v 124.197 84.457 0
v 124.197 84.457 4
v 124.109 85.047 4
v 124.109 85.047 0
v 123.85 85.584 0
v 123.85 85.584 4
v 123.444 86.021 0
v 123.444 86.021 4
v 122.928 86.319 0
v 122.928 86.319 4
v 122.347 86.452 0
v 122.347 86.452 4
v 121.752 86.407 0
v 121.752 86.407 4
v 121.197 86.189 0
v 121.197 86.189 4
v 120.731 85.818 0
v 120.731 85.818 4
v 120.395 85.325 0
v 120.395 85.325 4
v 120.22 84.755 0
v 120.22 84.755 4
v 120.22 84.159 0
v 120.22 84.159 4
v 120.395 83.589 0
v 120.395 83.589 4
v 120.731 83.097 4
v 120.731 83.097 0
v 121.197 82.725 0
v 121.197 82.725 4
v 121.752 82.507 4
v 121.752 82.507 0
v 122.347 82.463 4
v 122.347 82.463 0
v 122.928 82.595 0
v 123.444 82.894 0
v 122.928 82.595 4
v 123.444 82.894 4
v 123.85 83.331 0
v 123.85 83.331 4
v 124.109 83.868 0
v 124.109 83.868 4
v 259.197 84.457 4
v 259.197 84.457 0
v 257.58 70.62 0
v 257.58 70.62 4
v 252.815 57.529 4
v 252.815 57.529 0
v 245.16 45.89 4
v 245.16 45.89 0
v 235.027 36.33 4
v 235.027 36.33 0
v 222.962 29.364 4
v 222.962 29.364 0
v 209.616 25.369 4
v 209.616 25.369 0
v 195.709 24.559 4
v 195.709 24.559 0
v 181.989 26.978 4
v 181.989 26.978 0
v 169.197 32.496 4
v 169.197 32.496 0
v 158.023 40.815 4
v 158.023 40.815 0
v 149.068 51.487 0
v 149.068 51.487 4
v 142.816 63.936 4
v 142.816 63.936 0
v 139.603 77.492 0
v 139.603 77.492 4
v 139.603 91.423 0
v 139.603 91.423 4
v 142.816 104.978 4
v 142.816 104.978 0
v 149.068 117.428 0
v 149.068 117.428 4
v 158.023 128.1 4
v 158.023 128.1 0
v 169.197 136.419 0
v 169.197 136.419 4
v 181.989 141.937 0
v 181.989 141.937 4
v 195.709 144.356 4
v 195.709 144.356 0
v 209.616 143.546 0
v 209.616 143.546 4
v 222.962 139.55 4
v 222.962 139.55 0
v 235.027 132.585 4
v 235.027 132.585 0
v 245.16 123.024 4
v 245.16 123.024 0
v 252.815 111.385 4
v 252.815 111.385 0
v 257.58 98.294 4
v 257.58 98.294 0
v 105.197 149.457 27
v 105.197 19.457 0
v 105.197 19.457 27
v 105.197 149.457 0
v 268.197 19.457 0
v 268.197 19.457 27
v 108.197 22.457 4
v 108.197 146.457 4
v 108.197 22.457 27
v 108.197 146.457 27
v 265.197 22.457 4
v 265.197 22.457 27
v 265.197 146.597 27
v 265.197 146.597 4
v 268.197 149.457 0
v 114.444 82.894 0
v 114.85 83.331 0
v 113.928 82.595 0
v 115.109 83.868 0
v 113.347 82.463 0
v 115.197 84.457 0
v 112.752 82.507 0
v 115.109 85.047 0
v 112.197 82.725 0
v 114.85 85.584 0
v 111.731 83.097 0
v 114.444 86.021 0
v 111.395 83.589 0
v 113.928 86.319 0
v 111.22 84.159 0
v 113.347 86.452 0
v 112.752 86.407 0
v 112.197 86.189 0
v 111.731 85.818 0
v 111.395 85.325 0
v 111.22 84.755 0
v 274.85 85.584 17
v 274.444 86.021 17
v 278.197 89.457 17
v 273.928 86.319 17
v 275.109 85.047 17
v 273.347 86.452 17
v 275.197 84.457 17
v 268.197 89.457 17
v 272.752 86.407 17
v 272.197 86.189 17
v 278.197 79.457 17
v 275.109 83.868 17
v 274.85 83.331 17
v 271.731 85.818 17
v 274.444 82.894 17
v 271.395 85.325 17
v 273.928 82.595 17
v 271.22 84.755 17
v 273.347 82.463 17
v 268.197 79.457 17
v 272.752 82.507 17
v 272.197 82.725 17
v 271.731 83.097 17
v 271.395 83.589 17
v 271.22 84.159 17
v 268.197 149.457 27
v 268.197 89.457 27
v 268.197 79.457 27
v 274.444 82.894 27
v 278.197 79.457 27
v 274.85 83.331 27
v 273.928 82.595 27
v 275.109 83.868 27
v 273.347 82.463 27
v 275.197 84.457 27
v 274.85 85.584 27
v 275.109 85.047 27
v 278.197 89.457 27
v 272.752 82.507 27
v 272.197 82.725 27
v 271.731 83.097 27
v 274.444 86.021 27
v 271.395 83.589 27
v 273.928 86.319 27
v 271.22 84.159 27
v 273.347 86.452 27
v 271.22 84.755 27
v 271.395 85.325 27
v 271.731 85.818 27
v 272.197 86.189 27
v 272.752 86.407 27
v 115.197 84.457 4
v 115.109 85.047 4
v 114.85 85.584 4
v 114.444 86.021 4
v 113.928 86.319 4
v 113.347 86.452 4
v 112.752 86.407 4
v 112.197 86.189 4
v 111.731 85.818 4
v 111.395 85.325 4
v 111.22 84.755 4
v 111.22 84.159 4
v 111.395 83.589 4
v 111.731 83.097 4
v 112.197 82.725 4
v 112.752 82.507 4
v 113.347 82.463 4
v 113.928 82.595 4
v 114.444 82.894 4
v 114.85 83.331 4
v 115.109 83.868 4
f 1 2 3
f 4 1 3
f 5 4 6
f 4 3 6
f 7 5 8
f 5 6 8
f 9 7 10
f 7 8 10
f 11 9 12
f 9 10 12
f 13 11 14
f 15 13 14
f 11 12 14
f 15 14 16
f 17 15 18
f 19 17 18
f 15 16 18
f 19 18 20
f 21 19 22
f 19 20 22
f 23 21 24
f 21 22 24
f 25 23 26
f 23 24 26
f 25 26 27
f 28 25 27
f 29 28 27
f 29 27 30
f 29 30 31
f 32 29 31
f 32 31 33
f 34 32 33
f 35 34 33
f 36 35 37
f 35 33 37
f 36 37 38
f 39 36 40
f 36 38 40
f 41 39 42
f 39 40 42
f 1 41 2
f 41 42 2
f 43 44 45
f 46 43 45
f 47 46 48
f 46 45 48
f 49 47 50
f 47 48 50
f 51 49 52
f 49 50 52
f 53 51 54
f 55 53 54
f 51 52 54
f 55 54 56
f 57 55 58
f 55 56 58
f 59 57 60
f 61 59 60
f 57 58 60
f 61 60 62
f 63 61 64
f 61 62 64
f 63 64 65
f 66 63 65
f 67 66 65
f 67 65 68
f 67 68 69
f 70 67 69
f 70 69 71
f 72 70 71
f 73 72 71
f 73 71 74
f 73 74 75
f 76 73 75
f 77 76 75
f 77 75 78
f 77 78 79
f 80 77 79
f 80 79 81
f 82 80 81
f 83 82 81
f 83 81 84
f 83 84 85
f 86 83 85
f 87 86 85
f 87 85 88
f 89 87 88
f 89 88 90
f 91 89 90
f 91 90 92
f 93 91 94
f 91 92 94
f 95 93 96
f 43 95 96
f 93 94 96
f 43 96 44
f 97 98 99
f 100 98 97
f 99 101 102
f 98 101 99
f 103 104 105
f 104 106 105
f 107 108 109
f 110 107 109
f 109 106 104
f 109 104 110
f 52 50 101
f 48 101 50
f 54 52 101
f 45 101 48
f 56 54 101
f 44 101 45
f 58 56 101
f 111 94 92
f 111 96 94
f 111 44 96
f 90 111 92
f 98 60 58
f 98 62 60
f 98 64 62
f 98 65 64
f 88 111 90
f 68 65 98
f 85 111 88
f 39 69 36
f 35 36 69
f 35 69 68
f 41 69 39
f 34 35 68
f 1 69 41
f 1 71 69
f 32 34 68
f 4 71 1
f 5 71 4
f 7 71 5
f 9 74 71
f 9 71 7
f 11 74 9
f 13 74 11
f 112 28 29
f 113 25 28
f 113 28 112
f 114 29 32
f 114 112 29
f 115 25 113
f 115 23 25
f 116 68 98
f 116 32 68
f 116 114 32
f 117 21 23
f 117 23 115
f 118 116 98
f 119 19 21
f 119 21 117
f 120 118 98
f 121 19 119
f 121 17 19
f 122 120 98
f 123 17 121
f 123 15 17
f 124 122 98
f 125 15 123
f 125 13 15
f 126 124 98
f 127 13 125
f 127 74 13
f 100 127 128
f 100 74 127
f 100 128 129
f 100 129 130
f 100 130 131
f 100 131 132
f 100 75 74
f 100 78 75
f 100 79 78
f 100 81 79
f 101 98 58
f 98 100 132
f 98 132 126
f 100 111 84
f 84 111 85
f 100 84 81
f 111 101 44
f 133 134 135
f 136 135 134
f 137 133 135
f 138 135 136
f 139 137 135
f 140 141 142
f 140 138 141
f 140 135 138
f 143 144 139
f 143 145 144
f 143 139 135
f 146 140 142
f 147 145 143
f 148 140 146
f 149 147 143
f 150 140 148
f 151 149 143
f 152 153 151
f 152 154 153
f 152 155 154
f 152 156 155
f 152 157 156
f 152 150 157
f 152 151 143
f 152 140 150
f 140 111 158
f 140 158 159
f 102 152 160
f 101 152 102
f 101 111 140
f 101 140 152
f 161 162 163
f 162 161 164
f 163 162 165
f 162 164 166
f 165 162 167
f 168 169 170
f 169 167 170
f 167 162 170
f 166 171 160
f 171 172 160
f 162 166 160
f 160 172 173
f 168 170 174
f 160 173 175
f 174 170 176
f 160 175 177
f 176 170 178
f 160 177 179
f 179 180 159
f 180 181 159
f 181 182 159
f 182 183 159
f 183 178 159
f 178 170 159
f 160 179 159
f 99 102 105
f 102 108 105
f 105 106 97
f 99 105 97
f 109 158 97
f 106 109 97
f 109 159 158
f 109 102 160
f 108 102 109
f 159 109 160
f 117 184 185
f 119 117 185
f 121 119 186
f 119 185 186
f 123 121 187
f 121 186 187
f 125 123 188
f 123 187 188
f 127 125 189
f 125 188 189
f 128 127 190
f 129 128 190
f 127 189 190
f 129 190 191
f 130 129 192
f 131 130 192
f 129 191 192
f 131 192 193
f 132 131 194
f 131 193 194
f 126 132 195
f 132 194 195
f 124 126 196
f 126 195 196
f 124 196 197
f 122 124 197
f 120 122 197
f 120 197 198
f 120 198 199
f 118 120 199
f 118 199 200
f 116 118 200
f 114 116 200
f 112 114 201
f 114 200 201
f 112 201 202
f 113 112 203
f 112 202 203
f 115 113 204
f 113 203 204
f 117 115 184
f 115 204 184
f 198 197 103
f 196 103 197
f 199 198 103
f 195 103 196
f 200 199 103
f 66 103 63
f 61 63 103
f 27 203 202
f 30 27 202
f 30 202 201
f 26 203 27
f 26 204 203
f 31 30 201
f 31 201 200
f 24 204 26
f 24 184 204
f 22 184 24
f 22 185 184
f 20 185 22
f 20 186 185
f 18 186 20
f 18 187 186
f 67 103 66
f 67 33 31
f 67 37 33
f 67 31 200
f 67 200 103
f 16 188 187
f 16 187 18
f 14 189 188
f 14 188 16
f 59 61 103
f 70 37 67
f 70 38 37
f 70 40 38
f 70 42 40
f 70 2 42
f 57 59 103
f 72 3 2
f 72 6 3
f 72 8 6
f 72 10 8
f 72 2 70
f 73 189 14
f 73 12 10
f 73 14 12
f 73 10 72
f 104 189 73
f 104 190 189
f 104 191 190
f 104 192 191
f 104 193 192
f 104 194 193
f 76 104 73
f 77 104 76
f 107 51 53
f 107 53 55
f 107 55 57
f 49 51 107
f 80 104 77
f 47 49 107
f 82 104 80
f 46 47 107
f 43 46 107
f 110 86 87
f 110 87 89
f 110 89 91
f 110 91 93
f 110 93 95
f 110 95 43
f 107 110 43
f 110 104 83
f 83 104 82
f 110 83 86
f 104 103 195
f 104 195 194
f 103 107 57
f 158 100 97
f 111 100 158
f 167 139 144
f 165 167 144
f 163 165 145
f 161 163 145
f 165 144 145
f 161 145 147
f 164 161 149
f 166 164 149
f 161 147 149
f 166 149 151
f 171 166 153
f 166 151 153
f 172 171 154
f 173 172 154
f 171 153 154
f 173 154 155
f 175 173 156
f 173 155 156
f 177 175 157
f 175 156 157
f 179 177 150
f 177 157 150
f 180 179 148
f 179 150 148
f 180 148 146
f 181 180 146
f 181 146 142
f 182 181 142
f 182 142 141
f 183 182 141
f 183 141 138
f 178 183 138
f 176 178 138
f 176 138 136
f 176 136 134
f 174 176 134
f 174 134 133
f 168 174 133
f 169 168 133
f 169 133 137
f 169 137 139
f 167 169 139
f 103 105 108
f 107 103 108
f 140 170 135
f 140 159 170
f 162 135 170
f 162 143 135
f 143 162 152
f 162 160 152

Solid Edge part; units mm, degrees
sketch "Sketch1" plane through (0, 0, 0) normal (0, 0, 1) x (1, 0, 0)
  line L0 (105.1974, 149.4572) -> (268.1974, 149.4572)
  line L1 (268.1974, 149.4572) -> (268.1974, 19.4572)
  line L2 (268.1974, 19.4572) -> (105.1974, 19.4572)
  line L3 (105.1974, 19.4572) -> (105.1974, 149.4572)
  dimension "D1" = 163
  dimension "D2" = 130
extrude "Protrusion1" add sketch "Sketch1" along normal blind 27
sketch "Sketch2" plane through (170.1974, 84.4572, 27) normal (0, 0, 1) x (1, 0, 0)
  line L0 (-62, 62) -> (-62, -62)
  line L1 (-62, -62) -> (95, -62)
  line L2 (95, -62) -> (95, 62.14)
  line L3 (-62, 62) -> (95, 62.14)
  dimension "D1" = 3
  dimension "D2" = 3
  dimension "D3" = 3
  dimension "D4" = 3
  dimension "D5" = 3
extrude "ExtrudedCutout_1" cut sketch "Sketch2" against normal blind 23
sketch "Sketch3" plane through (170.1974, 84.5136, 4) normal (0, 0, 1) x (1, 0, 0)
  circle A0 centre (-57, -0.0564) radius 2
  circle A1 centre (-48, -0.0564) radius 2
  dimension "D1" = 4
  dimension "D2" = 5
  dimension "D3" = 4
  dimension "D4" = 9
extrude "Cutout1" cut sketch "Sketch3" against normal through all
sketch "Sketch4" plane through (186.6974, 84.4572, 0) normal (0, 0, -1) x (1, 0, 0)
  circle A0 centre (12.5, 0) radius 60
  dimension "D1" = 120
  dimension "D2" = 94
extrude "Cutout2" cut sketch "Sketch4" against normal through all
sketch "Sketch5" plane through (268.1974, 84.4572, 13.5) normal (1, 0, 0) x (0, 0, 1)
  line L0 (13.5, 0) -> (13.5, 5)
  line L1 (13.5, 5) -> (3.5, 5)
  line L2 (3.5, -5) -> (3.5, 5)
  line L3 (13.5, -5) -> (3.5, -5)
  line L4 (13.5, 0) -> (13.5, -5)
  dimension "D1" = 5
  dimension "D2" = 5
  dimension "D3" = 10
  dimension "D4" = 10
extrude "ExtrudedProtrusion_7" add sketch "Sketch5" along normal blind 10
sketch "Sketch6" plane through (273.1974, 84.4572, 17) normal (0, 0, -1) x (1, 0, 0)
  circle A0 centre (0, 0) radius 2
  dimension "D1" = 4
  dimension "D2" = 5
  dimension "D3" = 5
extrude "Cutout3" cut sketch "Sketch6" against normal through all
